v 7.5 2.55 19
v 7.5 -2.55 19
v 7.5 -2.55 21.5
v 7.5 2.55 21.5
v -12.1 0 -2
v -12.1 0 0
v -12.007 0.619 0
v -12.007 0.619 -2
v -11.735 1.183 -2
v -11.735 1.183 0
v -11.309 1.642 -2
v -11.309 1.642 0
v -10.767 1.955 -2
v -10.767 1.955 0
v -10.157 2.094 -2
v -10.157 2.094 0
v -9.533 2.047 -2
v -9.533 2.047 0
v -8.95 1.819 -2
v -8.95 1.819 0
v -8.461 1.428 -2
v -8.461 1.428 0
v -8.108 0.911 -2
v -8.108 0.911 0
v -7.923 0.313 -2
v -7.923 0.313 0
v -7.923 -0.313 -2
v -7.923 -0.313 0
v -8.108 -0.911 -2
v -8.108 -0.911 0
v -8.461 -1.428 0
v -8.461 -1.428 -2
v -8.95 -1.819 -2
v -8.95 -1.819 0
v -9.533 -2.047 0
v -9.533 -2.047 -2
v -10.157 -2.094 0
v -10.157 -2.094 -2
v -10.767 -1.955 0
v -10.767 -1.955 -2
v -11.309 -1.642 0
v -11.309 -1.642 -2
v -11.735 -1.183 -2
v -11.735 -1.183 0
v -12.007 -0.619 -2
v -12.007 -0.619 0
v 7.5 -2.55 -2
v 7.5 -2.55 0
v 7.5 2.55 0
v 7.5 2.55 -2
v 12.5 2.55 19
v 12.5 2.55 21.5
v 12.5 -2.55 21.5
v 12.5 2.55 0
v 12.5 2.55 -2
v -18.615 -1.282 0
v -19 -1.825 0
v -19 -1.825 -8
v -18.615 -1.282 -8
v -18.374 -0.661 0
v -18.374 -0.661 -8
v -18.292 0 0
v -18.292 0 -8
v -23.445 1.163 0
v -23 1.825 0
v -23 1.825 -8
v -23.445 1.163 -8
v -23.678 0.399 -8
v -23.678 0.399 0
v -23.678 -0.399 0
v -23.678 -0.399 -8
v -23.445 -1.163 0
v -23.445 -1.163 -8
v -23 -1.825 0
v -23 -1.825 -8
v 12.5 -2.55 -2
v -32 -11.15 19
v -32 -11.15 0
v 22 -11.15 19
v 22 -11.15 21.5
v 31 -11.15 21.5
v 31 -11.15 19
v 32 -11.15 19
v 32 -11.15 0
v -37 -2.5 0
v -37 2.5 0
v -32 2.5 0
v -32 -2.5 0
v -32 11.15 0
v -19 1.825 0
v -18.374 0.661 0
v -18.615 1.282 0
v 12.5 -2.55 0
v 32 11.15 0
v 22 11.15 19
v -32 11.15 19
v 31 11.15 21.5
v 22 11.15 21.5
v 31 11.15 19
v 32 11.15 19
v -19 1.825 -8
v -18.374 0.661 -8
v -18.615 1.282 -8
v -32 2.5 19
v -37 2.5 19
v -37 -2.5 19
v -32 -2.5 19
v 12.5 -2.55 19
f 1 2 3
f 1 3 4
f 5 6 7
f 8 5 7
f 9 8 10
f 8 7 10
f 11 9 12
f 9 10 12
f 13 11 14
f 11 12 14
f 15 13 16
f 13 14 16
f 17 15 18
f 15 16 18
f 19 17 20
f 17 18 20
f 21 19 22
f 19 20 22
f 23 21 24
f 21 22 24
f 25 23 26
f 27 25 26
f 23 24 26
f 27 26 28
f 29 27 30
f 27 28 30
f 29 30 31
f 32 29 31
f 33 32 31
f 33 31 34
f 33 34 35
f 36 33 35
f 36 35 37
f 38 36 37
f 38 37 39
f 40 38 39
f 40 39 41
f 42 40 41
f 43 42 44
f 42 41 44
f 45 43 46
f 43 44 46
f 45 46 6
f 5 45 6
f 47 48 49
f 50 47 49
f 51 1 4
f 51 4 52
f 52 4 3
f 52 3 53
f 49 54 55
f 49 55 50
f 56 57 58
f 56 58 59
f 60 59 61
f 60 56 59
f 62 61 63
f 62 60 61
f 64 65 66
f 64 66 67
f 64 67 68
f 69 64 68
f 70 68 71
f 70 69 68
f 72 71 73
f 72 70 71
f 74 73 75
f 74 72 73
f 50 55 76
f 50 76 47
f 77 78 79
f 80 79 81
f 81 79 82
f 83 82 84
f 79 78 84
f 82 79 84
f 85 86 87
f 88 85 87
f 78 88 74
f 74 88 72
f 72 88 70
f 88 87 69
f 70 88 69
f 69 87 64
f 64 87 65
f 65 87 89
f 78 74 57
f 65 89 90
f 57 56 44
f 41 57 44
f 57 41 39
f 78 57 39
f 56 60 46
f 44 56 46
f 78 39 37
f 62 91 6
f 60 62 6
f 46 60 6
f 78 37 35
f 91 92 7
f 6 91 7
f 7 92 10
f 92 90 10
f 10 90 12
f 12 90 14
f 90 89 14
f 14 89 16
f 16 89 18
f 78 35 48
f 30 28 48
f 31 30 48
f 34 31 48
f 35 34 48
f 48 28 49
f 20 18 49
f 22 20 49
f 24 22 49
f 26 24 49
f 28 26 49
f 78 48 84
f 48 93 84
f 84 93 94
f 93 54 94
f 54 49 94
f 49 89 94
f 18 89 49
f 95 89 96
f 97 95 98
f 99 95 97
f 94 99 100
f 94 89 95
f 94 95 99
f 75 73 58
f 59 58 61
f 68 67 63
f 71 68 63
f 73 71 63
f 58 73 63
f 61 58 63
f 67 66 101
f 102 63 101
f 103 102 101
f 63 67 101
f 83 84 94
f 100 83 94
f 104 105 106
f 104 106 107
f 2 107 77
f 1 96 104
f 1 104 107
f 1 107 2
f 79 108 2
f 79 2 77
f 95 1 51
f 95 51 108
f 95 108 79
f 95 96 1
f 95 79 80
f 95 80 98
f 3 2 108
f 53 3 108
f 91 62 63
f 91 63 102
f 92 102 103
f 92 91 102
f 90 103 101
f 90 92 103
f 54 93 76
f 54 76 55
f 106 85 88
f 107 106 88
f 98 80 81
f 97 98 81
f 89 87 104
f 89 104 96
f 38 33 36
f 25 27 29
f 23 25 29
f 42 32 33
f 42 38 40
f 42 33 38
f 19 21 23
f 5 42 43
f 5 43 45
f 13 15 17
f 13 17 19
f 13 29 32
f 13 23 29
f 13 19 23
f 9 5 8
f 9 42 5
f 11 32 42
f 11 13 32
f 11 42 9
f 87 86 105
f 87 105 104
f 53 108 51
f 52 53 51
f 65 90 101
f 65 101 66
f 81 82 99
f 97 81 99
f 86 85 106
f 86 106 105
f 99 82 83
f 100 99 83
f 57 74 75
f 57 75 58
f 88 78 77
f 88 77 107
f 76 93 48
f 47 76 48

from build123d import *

# Parameters (mm, degrees)
SKETCH2_W           = 64
SKETCH2_H           = 22.3
SKETCH2_W_2         = 5
SKETCH2_H_2         = 5
BOSS_EXTRUDE1_DEPTH = 19
BOSS_EXTRUDE2_DEPTH = 8
SKETCH4_R           = 2.1
SKETCH4_W           = 5
SKETCH4_H           = 5.1
BOSS_EXTRUDE3_DEPTH = 2
SKETCH5_W           = 5
SKETCH5_H           = 5.1
SKETCH5_W_2         = 9
SKETCH5_H_2         = 22.3
BOSS_EXTRUDE4_DEPTH = 2.5


with BuildPart() as part:
    # Sketch2 → Boss-Extrude1 (new body)
    with BuildSketch(Plane.XY):
        Rectangle(SKETCH2_W, SKETCH2_H)
        with Locations((-34.5, 0)):
            Rectangle(SKETCH2_W_2, SKETCH2_H_2)
    extrude(amount=BOSS_EXTRUDE1_DEPTH)

    # Sketch3 → Boss-Extrude2 (add)
    with BuildSketch(Plane.XY):
        with BuildLine():
            ThreePointArc((-23, 1.825), (-23.707512696, 0), (-23, -1.825))
            Line((-23, -1.825), (-19, -1.825))
            ThreePointArc((-19, -1.825), (-18.475554477, -0.97867247), (-18.292487304, 0))
            ThreePointArc((-18.292487304, 0), (-18.475554477, 0.97867247), (-19, 1.825))
            Line((-19, 1.825), (-23, 1.825))
        make_face()
    extrude(amount=-BOSS_EXTRUDE2_DEPTH)

    # Sketch4 → Boss-Extrude3 (add)
    with BuildSketch(Plane(origin=(0, 0, 0), x_dir=(-1, 0, 0), z_dir=(0, 0, -1))):
        with Locations((10, 0)):
            Circle(SKETCH4_R)
        with Locations((-10, 0)):
            Rectangle(SKETCH4_W, SKETCH4_H)
    extrude(amount=BOSS_EXTRUDE3_DEPTH)

    # Sketch5 → Boss-Extrude4 (add)
    with BuildSketch(Plane.XY.offset(19)):
        with Locations((10, 0)):
            Rectangle(SKETCH5_W, SKETCH5_H)
        with Locations((26.5, 0)):
            Rectangle(SKETCH5_W_2, SKETCH5_H_2)
    extrude(amount=BOSS_EXTRUDE4_DEPTH)


solid = part.part
